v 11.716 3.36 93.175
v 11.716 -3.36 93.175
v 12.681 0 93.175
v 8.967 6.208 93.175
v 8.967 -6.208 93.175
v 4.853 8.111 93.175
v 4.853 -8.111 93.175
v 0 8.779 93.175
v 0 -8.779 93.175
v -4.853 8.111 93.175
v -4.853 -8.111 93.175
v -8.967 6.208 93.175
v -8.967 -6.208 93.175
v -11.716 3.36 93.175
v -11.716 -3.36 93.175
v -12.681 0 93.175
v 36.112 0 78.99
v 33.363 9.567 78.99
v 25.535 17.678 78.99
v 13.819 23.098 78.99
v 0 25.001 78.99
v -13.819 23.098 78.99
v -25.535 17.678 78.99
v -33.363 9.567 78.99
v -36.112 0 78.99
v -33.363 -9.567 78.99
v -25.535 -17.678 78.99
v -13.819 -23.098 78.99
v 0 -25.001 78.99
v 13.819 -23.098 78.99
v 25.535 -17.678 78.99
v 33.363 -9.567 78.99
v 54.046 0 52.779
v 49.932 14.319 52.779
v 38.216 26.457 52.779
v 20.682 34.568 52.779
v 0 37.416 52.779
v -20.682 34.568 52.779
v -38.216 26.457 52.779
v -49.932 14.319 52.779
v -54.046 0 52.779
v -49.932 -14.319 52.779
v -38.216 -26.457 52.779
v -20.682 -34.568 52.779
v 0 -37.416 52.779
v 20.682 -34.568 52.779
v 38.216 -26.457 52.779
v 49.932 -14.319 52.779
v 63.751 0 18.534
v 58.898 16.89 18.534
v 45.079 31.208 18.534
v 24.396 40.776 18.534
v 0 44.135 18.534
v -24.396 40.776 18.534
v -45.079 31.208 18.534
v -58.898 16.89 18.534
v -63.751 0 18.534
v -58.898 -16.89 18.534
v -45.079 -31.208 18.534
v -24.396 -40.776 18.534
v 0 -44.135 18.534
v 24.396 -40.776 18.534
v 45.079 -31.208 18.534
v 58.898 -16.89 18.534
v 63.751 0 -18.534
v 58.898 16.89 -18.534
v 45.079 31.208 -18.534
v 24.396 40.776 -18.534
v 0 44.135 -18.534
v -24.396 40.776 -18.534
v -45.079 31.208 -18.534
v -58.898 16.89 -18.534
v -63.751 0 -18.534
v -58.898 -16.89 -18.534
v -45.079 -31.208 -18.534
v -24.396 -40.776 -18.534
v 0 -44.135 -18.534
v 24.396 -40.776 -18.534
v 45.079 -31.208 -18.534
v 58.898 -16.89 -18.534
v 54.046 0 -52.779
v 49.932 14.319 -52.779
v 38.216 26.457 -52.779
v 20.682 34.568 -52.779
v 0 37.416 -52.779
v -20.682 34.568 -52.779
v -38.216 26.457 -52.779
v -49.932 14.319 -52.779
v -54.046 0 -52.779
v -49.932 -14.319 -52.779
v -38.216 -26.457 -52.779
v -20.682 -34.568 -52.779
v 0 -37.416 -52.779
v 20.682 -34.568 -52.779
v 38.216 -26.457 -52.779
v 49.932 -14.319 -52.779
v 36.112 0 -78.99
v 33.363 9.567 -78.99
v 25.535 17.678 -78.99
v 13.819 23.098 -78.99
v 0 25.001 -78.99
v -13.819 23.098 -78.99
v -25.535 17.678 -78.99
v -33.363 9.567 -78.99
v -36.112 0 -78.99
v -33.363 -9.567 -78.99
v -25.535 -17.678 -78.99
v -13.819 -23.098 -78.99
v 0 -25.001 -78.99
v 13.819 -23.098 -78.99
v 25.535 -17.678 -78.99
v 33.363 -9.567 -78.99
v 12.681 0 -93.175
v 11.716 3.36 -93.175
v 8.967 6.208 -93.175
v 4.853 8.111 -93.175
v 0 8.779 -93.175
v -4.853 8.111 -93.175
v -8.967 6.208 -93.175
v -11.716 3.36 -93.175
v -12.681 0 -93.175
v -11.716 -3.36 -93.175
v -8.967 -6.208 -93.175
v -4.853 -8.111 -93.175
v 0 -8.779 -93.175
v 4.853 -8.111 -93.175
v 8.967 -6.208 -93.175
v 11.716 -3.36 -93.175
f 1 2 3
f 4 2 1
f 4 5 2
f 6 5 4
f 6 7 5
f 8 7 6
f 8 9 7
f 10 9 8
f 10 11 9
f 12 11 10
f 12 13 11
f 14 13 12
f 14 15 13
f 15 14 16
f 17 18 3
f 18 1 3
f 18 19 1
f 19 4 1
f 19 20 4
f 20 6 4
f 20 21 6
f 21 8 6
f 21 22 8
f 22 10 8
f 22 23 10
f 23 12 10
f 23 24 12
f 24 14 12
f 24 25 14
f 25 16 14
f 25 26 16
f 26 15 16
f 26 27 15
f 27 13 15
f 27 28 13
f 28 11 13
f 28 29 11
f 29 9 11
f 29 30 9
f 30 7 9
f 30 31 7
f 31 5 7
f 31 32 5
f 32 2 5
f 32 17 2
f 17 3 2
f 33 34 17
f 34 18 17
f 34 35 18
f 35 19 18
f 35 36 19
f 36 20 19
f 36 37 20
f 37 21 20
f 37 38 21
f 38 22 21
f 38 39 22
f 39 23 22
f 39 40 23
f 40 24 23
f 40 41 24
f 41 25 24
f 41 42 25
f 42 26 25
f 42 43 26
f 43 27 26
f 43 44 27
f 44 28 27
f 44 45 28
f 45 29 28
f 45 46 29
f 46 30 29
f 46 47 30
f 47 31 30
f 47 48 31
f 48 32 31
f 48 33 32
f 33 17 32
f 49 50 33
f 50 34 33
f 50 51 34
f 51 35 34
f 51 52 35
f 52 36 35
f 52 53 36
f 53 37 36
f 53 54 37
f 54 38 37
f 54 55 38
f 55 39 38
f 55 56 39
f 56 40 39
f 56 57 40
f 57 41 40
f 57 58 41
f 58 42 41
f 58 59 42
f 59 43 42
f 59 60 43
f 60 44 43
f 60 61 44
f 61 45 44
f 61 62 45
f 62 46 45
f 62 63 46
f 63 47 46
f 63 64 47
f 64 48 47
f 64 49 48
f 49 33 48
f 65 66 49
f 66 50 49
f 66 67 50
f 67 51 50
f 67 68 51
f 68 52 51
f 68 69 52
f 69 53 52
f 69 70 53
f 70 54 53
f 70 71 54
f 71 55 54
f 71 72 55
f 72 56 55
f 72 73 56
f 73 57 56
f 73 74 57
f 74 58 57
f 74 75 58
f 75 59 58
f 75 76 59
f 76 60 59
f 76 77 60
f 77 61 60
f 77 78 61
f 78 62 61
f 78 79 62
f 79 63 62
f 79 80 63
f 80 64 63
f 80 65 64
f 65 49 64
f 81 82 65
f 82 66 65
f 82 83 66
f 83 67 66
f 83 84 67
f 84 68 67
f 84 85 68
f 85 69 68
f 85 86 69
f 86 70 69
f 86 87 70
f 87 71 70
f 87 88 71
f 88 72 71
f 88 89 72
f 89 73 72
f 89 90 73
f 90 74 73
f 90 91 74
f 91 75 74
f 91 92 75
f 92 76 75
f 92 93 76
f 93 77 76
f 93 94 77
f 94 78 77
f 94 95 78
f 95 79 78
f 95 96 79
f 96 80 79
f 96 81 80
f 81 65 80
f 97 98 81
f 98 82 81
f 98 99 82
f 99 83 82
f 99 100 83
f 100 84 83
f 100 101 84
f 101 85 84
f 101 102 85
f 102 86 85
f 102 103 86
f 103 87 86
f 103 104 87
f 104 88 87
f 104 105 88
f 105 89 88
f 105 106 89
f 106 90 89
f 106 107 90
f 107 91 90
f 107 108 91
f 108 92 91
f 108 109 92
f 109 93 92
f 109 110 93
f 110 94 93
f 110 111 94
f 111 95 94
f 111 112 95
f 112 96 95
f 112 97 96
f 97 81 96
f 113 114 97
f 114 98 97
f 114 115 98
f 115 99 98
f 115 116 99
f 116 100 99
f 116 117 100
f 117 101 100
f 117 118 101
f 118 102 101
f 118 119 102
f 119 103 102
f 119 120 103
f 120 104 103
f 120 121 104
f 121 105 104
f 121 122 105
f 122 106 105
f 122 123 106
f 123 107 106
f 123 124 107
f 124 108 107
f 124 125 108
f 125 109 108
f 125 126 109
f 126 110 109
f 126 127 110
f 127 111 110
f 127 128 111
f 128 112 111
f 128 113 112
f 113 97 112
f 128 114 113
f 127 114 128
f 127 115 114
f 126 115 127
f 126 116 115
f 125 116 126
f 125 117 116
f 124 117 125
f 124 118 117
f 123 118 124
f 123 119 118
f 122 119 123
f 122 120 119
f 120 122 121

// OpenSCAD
// Generated by SolidPython 1.0.1 on 2020-07-29 00:46:50


scale(v = [13, 9, 19]) {
	sphere(r = 5);
}
/***********************************************
*********      SolidPython code:      **********
************************************************
 
# import packages: SolidPython
from solid import *
from solid.utils import *
from itertools import chain, combinations, permutations


class Resize:

    def __init__(self, scad_file):
        self.scad_file = scad_file
        #self.scad_file = import_scad(scad_file)
        # cone/cylinder param:
        self.r1 = 0
        self.r2 = 0
        self.h = 0
        # rectangular prism param:
        self.w = 0
        self.l = 0
        # ellipse param:
        self.r = 0

    # import OpenScad code (file name corresponds to shape)


    # classify shape + parameters
    def assign(self, param1, param2, param3):
        if self.scad_file == 'cone.scad':
            self.r1 = param1
            self.r2 = param2
            self.h = param3
        elif self.scad_file == 'cylinder.scad':
            self.r1 = param1
            self.r2 = param2
            self.h = param3
        elif self.scad_file == 'rectangularPrism.scad':
            self.h = param1
            self.l = param2
            self.w = param3
        else:
            self.r = param1
            self.h = param2

    # resize parameters
    def iterate(self):
        x = range(3, 20, 2)
        i = 1
        if self.scad_file == 'cone.scad':
            tempList = list(permutations(x, 2))
            for temp in tempList:
                param1 = temp[0]
                param2 = temp[1]
                filepath = 'produced_scad_files/' + 'cone' + str(param1) + '_' + str(param2) + '_' + '.scad'
                scad_render_to_file(cylinder(h=param1, r1=param2, r2=0), filepath)

        elif self.scad_file == 'cylinder.scad':
            tempList = list(permutations(x, 3))
            for temp in tempList:
                param1 = temp[0]
                param2 = temp[1]
                filepath = 'produced_scad_files/' + 'cylinder' + str(param1) + '_' + str(param2) + '_' + '.scad'
                scad_render_to_file(cylinder(h=param1, r1=param2, r2=param2), filepath)

        elif self.scad_file == 'rectangularPrism.scad':
            tempList = list(permutations(x, 3))
            for temp in tempList:
                param1 = temp[0]
                param2 = temp[1]
                param3 = temp[2]
                filepath = 'produced_scad_files/' + 'rectangularPrism' + str(param1) + '_' + str(param2) + '_' + str(
                    param3) + '.scad'
                scad_render_to_file(cube(size=(param1, param2, param3)), filepath)

        elif self.scad_file == 'ellipse.scad':
            tempList = list(permutations(x, 4))
            for temp in tempList:
                param1 = temp[0]
                param2 = temp[1]
                param3 = temp[2]
                param4 = temp[3]
                filepath = 'produced_scad_files/' + 'ellipse' + str(param1) + '_' + str(param2) + '_' + str(param3) + '_' + str(param4) + '.scad'
                scad_render_to_file(scale([param1, param2, param3])(sphere(r=param4)), filepath)

    def render_to_scadfile(self):
        scad_render_to_file(scad, 'example.scad') 
 
************************************************/
